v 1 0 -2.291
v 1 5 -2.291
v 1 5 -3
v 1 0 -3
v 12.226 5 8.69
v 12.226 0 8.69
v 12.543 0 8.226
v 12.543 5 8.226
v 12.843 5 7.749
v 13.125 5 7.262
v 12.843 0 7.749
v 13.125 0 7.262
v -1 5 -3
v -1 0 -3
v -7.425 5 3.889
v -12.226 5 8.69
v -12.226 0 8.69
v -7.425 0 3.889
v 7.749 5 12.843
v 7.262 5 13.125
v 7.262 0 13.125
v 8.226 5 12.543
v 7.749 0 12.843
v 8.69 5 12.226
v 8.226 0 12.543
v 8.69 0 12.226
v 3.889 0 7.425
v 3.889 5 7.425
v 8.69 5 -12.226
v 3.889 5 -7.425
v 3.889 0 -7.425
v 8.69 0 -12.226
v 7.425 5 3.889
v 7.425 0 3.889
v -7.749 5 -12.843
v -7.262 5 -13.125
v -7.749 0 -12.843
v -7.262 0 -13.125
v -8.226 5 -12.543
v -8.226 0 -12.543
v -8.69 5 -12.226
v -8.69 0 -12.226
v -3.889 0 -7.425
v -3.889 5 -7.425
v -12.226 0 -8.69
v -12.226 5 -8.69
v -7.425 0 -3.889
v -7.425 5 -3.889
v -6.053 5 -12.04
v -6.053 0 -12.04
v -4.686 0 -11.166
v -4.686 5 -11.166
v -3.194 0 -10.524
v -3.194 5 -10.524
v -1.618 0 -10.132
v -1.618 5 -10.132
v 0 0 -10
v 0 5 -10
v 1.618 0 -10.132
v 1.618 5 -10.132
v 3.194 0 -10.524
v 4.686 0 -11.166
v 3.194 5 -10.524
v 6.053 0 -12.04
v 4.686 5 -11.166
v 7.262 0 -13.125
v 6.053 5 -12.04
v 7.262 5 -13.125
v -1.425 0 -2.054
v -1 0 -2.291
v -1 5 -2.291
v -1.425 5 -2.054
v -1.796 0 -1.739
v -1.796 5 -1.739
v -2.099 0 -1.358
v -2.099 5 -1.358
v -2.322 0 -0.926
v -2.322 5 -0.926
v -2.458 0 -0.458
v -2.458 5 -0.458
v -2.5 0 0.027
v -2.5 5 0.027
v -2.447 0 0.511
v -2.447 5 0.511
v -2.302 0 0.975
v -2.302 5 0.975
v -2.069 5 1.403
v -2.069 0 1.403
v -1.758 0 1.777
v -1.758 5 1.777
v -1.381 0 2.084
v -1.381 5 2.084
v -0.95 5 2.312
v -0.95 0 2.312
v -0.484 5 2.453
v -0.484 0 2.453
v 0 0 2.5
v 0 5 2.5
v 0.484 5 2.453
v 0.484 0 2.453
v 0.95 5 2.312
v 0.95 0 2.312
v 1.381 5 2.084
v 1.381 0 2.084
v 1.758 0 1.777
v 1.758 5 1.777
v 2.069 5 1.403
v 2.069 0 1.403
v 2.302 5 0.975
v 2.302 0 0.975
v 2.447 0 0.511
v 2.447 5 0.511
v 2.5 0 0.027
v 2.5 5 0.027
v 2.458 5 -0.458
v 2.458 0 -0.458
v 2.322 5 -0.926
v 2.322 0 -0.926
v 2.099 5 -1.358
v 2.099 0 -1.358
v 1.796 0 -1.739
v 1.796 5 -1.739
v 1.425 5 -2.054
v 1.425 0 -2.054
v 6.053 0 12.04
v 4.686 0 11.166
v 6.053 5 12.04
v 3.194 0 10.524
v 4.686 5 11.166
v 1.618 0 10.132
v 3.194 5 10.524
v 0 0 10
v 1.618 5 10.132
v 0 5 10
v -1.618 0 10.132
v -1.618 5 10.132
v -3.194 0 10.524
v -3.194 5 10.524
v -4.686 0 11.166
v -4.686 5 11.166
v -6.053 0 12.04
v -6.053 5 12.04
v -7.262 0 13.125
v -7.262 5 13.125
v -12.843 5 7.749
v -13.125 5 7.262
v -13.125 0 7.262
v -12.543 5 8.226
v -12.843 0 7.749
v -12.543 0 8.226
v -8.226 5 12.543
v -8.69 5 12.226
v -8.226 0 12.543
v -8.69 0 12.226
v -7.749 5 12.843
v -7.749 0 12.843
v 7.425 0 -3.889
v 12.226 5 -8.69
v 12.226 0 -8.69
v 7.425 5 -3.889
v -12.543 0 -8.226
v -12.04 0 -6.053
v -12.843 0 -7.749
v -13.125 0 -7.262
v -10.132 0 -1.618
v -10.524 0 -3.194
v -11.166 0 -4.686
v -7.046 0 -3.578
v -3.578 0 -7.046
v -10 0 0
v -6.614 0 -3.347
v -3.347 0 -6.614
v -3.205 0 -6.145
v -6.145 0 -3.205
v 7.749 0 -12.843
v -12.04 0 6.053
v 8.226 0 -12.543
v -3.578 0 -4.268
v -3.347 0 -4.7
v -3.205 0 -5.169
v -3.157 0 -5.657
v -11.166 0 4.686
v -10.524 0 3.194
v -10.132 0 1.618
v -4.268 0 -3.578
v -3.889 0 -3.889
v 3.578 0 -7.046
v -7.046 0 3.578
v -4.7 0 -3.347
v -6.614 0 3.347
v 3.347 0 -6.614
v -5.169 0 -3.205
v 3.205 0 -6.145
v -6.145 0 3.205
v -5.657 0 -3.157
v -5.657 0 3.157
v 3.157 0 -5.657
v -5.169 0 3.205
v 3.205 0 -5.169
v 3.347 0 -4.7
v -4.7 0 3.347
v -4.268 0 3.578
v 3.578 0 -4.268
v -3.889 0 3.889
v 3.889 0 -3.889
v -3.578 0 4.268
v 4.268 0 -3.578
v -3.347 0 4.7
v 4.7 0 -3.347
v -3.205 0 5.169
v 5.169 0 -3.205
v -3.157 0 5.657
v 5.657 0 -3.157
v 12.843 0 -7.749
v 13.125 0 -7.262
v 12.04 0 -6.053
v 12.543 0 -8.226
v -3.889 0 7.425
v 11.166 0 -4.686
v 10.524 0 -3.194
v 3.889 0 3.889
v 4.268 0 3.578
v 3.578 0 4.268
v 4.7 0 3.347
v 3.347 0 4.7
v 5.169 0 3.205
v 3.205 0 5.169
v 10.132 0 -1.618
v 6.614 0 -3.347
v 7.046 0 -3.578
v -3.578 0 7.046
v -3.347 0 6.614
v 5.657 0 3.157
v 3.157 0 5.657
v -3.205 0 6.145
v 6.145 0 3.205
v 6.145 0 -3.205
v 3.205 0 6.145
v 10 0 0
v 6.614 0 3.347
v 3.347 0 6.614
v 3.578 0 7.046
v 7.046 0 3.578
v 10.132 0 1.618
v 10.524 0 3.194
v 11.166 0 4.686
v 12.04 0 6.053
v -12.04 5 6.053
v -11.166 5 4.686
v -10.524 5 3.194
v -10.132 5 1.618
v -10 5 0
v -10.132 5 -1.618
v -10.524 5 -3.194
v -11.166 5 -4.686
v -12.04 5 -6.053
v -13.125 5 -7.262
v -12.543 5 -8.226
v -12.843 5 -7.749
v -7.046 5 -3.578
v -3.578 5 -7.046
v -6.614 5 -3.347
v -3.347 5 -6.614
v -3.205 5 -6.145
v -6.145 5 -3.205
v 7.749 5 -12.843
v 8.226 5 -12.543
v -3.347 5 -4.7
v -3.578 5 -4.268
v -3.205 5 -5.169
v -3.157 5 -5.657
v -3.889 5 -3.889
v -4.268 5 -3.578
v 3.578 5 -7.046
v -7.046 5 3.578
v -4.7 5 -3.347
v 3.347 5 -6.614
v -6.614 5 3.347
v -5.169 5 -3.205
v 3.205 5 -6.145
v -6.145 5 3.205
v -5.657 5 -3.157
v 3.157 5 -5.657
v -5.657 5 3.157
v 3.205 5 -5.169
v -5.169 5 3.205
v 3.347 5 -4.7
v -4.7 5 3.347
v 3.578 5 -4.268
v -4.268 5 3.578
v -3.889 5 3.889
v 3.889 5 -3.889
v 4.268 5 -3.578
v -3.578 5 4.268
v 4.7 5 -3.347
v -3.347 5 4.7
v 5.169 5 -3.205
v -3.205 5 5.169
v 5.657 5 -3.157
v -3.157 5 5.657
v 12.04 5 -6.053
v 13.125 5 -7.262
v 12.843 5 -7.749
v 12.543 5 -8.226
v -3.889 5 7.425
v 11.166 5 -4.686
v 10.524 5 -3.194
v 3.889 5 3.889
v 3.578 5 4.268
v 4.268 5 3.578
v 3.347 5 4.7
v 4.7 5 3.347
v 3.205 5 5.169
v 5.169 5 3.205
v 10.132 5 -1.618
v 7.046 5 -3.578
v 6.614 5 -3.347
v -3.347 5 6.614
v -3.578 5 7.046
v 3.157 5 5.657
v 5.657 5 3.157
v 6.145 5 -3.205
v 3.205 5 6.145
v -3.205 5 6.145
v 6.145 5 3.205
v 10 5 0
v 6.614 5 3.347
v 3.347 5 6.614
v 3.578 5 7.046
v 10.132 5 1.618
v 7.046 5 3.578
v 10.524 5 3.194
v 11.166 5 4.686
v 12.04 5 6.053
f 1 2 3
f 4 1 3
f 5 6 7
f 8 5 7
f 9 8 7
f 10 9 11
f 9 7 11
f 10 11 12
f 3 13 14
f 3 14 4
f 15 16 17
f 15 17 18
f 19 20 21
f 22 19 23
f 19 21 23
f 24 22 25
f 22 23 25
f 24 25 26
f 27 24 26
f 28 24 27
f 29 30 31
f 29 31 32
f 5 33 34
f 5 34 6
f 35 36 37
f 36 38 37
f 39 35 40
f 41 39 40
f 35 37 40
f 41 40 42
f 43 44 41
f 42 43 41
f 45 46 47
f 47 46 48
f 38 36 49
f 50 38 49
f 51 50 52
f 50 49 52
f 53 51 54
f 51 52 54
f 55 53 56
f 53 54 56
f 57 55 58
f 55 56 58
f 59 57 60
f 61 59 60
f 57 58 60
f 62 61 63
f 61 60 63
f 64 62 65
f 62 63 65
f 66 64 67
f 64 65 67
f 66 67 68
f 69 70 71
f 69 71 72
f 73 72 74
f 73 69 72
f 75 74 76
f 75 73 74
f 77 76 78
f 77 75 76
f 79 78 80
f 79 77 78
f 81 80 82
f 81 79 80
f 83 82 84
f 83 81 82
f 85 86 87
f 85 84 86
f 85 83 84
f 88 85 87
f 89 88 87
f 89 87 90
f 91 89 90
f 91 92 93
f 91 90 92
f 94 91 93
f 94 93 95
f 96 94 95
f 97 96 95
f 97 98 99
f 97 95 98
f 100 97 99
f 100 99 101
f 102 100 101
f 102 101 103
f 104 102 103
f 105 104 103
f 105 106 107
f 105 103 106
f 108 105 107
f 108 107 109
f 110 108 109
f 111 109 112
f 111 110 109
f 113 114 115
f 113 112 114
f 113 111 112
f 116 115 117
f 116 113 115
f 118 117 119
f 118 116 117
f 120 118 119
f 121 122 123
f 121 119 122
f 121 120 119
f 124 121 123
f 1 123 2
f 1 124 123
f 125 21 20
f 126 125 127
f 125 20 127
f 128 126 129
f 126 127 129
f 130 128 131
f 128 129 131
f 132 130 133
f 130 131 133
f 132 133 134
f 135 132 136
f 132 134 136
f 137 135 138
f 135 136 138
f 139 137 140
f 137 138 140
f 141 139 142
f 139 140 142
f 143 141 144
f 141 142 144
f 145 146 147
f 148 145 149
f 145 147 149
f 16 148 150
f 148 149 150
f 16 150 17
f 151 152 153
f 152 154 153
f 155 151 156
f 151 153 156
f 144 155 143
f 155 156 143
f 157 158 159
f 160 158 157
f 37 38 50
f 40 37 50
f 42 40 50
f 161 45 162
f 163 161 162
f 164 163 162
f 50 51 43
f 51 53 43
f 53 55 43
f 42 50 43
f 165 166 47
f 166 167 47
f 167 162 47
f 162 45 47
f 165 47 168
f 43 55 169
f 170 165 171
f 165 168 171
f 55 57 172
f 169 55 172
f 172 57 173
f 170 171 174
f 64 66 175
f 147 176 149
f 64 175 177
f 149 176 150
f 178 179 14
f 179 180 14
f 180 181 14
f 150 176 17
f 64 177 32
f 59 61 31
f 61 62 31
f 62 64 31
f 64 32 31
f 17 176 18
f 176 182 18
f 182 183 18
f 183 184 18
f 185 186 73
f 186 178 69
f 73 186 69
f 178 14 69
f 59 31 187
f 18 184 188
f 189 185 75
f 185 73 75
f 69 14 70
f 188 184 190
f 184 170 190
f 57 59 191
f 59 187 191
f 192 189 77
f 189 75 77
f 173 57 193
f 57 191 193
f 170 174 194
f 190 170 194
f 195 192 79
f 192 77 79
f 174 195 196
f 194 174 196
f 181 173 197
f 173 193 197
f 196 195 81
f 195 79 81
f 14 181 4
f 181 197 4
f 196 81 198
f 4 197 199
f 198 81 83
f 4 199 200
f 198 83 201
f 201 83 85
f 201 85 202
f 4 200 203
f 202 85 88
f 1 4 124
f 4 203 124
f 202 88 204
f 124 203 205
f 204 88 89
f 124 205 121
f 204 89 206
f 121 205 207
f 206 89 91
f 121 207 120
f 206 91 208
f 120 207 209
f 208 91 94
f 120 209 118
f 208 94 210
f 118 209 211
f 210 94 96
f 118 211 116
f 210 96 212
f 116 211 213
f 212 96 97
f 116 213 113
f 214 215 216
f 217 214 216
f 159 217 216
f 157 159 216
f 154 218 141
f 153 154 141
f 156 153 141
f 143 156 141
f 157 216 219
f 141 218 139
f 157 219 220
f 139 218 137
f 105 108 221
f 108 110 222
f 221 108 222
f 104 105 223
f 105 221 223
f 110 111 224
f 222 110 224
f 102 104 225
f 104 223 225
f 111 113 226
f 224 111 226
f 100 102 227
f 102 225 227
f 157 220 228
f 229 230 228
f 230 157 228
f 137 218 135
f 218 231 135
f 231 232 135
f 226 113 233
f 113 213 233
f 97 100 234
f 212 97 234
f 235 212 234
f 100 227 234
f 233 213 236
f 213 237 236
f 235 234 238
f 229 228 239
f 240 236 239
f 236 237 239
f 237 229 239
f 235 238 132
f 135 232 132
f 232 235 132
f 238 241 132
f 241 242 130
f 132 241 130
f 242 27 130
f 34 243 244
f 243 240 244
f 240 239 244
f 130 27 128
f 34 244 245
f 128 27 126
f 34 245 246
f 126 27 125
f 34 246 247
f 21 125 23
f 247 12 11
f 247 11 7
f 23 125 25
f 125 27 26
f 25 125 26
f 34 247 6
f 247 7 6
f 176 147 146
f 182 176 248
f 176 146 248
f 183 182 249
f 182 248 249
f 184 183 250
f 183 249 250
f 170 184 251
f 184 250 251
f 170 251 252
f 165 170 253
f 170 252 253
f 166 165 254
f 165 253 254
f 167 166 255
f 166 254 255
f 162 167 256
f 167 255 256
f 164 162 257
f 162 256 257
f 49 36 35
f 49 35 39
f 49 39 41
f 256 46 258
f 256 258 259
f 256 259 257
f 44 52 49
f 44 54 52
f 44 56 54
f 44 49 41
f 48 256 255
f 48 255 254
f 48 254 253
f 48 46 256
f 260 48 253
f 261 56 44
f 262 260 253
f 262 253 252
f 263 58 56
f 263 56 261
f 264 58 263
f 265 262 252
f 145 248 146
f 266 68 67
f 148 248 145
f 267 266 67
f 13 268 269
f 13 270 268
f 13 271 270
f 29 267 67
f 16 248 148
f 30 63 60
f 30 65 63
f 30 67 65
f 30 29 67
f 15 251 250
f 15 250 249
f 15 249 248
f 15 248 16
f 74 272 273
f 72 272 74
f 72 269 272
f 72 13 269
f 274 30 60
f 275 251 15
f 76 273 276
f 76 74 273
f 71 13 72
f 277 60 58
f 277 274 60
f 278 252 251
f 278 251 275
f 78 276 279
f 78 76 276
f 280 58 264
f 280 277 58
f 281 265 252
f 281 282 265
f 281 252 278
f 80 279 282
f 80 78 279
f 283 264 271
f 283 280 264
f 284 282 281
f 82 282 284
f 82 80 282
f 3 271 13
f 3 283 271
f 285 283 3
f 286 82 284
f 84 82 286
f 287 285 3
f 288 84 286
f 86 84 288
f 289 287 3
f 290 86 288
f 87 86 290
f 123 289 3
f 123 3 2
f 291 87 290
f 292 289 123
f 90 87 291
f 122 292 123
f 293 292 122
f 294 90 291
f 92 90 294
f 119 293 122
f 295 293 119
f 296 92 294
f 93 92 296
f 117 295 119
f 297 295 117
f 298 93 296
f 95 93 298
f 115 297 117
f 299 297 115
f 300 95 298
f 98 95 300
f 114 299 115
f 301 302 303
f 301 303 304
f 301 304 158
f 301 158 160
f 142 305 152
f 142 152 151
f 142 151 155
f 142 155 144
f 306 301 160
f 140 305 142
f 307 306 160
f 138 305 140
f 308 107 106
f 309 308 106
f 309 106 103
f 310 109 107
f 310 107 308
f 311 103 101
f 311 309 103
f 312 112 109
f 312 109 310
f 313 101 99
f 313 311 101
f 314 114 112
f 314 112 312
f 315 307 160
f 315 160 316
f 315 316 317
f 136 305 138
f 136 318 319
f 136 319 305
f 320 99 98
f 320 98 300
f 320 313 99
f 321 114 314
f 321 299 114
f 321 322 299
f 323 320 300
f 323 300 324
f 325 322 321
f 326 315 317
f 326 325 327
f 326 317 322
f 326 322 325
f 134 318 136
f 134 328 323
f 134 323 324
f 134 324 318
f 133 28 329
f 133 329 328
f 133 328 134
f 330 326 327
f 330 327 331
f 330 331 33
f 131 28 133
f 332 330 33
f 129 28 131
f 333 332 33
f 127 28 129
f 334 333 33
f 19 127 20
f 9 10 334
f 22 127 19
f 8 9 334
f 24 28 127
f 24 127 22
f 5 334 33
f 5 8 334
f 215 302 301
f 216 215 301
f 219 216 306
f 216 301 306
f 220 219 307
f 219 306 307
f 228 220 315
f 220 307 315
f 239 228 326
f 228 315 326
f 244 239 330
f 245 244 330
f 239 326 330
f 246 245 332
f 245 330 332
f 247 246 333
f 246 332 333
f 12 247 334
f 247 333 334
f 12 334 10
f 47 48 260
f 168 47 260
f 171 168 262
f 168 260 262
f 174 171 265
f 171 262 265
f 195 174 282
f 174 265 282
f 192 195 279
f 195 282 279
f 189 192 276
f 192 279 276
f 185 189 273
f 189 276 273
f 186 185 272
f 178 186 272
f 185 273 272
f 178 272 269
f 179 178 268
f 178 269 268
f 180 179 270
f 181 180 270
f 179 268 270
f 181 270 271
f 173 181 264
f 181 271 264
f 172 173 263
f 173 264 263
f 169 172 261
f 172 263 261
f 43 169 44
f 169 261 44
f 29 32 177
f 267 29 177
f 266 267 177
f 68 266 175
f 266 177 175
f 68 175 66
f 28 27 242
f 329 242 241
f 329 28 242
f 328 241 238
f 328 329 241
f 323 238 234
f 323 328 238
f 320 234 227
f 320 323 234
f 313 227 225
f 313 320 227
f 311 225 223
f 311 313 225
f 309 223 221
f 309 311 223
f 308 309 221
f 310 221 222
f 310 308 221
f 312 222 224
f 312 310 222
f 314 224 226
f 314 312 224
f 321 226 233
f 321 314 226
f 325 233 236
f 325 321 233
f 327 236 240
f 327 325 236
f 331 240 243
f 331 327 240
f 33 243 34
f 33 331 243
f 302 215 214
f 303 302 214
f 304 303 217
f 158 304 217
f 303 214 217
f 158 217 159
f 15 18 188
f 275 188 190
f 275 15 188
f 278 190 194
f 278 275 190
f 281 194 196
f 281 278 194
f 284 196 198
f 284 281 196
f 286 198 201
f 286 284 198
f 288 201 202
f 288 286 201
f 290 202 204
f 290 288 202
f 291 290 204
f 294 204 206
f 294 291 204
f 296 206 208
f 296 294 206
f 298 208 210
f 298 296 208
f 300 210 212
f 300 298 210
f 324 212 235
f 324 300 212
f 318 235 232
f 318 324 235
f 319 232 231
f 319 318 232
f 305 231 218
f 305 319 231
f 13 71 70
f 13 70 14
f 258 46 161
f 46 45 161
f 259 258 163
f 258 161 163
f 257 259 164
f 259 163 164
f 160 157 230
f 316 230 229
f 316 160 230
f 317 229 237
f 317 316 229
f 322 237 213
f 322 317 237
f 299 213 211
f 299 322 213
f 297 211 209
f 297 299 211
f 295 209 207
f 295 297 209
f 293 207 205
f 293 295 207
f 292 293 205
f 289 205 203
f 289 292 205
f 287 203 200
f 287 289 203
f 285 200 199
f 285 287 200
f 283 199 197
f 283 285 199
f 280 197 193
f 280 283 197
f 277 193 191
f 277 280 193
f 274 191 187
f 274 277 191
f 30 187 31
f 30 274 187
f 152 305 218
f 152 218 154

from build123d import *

# Parameters (mm, degrees)
SKETCH_1_R          = 15
SKETCH_1_R_2        = 2.5
EXTRUDE_1_DEPTH     = 5
SKETCH_2_W          = 2
SKETCH_2_H          = 1
CUT_EXTRUDE_1_DEPTH = 10
SKETCH_3_R          = 10
CUT_EXTRUDE_2_DEPTH = 10
CUT_EXTRUDE_3_DEPTH = 10


with BuildPart() as part:
    # 草图1 → 凸台-拉伸1 (new body)
    with BuildSketch(Plane(origin=(0, 0, 0), x_dir=(1, 0, 0), z_dir=(0, 1, 0))):
        with Locations(Location((0, 0, 0), (0, 0, 270))):
            Circle(SKETCH_1_R)
        with Locations(Location((0, 0, 0), (0, 0, 270))):
            Circle(SKETCH_1_R_2, mode=Mode.SUBTRACT)
    extrude(amount=EXTRUDE_1_DEPTH)

    # 草图2 → 切除-拉伸1 (cut)
    with BuildSketch(Plane(origin=(0, 5, 0), x_dir=(1, 0, 0), z_dir=(0, 1, 0))):
        with Locations((0, 2.5)):
            Rectangle(SKETCH_2_W, SKETCH_2_H)
    extrude(amount=-CUT_EXTRUDE_1_DEPTH, mode=Mode.SUBTRACT)

    # 草图3 → 切除-拉伸2 (cut)
    with BuildSketch(Plane(origin=(0, 5, 0), x_dir=(1, 0, 0), z_dir=(0, 1, 0))):
        with Locations((0, 20)):
            Circle(SKETCH_3_R)
        with Locations((20, 0)):
            Circle(SKETCH_3_R)
        with Locations((0, -20)):
            Circle(SKETCH_3_R)
        with Locations((-20, 0)):
            Circle(SKETCH_3_R)
    extrude(amount=-CUT_EXTRUDE_2_DEPTH, mode=Mode.SUBTRACT)

    # 草图4 → 切除-拉伸3 (cut)
    with BuildSketch(Plane(origin=(0, 5, 0), x_dir=(1, 0, 0), z_dir=(0, 1, 0))):
        with BuildLine():
            Line((-12.639931989, 9.104398083), (-7.424621202, 3.889087297))
            ThreePointArc((-7.424621202, 3.889087297), (-3.889087297, 3.889087297), (-3.889087297, 7.424621202))
            Line((-3.889087297, 7.424621202), (-9.104398083, 12.639931989))
            Line((-9.104398083, 12.639931989), (-12.639931989, 9.104398083))
        make_face()
        with BuildLine():
            Line((12.639931989, 9.104398083), (7.424621202, 3.889087297))
            ThreePointArc((7.424621202, 3.889087297), (3.889087297, 3.889087297), (3.889087297, 7.424621202))
            Line((3.889087297, 7.424621202), (9.104398083, 12.639931989))
            Line((9.104398083, 12.639931989), (12.639931989, 9.104398083))
        make_face()
        with BuildLine():
            Line((9.104398083, -12.639931989), (3.889087297, -7.424621202))
            ThreePointArc((3.889087297, -7.424621202), (3.889087297, -3.889087297), (7.424621202, -3.889087297))
            Line((7.424621202, -3.889087297), (12.639931989, -9.104398083))
            Line((12.639931989, -9.104398083), (9.104398083, -12.639931989))
        make_face()
        with BuildLine():
            Line((-12.639931989, -9.104398083), (-7.424621202, -3.889087297))
            ThreePointArc((-7.424621202, -3.889087297), (-3.889087297, -3.889087297), (-3.889087297, -7.424621202))
            Line((-3.889087297, -7.424621202), (-9.104398083, -12.639931989))
            Line((-9.104398083, -12.639931989), (-12.639931989, -9.104398083))
        make_face()
    extrude(amount=-CUT_EXTRUDE_3_DEPTH, mode=Mode.SUBTRACT)


solid = part.part
